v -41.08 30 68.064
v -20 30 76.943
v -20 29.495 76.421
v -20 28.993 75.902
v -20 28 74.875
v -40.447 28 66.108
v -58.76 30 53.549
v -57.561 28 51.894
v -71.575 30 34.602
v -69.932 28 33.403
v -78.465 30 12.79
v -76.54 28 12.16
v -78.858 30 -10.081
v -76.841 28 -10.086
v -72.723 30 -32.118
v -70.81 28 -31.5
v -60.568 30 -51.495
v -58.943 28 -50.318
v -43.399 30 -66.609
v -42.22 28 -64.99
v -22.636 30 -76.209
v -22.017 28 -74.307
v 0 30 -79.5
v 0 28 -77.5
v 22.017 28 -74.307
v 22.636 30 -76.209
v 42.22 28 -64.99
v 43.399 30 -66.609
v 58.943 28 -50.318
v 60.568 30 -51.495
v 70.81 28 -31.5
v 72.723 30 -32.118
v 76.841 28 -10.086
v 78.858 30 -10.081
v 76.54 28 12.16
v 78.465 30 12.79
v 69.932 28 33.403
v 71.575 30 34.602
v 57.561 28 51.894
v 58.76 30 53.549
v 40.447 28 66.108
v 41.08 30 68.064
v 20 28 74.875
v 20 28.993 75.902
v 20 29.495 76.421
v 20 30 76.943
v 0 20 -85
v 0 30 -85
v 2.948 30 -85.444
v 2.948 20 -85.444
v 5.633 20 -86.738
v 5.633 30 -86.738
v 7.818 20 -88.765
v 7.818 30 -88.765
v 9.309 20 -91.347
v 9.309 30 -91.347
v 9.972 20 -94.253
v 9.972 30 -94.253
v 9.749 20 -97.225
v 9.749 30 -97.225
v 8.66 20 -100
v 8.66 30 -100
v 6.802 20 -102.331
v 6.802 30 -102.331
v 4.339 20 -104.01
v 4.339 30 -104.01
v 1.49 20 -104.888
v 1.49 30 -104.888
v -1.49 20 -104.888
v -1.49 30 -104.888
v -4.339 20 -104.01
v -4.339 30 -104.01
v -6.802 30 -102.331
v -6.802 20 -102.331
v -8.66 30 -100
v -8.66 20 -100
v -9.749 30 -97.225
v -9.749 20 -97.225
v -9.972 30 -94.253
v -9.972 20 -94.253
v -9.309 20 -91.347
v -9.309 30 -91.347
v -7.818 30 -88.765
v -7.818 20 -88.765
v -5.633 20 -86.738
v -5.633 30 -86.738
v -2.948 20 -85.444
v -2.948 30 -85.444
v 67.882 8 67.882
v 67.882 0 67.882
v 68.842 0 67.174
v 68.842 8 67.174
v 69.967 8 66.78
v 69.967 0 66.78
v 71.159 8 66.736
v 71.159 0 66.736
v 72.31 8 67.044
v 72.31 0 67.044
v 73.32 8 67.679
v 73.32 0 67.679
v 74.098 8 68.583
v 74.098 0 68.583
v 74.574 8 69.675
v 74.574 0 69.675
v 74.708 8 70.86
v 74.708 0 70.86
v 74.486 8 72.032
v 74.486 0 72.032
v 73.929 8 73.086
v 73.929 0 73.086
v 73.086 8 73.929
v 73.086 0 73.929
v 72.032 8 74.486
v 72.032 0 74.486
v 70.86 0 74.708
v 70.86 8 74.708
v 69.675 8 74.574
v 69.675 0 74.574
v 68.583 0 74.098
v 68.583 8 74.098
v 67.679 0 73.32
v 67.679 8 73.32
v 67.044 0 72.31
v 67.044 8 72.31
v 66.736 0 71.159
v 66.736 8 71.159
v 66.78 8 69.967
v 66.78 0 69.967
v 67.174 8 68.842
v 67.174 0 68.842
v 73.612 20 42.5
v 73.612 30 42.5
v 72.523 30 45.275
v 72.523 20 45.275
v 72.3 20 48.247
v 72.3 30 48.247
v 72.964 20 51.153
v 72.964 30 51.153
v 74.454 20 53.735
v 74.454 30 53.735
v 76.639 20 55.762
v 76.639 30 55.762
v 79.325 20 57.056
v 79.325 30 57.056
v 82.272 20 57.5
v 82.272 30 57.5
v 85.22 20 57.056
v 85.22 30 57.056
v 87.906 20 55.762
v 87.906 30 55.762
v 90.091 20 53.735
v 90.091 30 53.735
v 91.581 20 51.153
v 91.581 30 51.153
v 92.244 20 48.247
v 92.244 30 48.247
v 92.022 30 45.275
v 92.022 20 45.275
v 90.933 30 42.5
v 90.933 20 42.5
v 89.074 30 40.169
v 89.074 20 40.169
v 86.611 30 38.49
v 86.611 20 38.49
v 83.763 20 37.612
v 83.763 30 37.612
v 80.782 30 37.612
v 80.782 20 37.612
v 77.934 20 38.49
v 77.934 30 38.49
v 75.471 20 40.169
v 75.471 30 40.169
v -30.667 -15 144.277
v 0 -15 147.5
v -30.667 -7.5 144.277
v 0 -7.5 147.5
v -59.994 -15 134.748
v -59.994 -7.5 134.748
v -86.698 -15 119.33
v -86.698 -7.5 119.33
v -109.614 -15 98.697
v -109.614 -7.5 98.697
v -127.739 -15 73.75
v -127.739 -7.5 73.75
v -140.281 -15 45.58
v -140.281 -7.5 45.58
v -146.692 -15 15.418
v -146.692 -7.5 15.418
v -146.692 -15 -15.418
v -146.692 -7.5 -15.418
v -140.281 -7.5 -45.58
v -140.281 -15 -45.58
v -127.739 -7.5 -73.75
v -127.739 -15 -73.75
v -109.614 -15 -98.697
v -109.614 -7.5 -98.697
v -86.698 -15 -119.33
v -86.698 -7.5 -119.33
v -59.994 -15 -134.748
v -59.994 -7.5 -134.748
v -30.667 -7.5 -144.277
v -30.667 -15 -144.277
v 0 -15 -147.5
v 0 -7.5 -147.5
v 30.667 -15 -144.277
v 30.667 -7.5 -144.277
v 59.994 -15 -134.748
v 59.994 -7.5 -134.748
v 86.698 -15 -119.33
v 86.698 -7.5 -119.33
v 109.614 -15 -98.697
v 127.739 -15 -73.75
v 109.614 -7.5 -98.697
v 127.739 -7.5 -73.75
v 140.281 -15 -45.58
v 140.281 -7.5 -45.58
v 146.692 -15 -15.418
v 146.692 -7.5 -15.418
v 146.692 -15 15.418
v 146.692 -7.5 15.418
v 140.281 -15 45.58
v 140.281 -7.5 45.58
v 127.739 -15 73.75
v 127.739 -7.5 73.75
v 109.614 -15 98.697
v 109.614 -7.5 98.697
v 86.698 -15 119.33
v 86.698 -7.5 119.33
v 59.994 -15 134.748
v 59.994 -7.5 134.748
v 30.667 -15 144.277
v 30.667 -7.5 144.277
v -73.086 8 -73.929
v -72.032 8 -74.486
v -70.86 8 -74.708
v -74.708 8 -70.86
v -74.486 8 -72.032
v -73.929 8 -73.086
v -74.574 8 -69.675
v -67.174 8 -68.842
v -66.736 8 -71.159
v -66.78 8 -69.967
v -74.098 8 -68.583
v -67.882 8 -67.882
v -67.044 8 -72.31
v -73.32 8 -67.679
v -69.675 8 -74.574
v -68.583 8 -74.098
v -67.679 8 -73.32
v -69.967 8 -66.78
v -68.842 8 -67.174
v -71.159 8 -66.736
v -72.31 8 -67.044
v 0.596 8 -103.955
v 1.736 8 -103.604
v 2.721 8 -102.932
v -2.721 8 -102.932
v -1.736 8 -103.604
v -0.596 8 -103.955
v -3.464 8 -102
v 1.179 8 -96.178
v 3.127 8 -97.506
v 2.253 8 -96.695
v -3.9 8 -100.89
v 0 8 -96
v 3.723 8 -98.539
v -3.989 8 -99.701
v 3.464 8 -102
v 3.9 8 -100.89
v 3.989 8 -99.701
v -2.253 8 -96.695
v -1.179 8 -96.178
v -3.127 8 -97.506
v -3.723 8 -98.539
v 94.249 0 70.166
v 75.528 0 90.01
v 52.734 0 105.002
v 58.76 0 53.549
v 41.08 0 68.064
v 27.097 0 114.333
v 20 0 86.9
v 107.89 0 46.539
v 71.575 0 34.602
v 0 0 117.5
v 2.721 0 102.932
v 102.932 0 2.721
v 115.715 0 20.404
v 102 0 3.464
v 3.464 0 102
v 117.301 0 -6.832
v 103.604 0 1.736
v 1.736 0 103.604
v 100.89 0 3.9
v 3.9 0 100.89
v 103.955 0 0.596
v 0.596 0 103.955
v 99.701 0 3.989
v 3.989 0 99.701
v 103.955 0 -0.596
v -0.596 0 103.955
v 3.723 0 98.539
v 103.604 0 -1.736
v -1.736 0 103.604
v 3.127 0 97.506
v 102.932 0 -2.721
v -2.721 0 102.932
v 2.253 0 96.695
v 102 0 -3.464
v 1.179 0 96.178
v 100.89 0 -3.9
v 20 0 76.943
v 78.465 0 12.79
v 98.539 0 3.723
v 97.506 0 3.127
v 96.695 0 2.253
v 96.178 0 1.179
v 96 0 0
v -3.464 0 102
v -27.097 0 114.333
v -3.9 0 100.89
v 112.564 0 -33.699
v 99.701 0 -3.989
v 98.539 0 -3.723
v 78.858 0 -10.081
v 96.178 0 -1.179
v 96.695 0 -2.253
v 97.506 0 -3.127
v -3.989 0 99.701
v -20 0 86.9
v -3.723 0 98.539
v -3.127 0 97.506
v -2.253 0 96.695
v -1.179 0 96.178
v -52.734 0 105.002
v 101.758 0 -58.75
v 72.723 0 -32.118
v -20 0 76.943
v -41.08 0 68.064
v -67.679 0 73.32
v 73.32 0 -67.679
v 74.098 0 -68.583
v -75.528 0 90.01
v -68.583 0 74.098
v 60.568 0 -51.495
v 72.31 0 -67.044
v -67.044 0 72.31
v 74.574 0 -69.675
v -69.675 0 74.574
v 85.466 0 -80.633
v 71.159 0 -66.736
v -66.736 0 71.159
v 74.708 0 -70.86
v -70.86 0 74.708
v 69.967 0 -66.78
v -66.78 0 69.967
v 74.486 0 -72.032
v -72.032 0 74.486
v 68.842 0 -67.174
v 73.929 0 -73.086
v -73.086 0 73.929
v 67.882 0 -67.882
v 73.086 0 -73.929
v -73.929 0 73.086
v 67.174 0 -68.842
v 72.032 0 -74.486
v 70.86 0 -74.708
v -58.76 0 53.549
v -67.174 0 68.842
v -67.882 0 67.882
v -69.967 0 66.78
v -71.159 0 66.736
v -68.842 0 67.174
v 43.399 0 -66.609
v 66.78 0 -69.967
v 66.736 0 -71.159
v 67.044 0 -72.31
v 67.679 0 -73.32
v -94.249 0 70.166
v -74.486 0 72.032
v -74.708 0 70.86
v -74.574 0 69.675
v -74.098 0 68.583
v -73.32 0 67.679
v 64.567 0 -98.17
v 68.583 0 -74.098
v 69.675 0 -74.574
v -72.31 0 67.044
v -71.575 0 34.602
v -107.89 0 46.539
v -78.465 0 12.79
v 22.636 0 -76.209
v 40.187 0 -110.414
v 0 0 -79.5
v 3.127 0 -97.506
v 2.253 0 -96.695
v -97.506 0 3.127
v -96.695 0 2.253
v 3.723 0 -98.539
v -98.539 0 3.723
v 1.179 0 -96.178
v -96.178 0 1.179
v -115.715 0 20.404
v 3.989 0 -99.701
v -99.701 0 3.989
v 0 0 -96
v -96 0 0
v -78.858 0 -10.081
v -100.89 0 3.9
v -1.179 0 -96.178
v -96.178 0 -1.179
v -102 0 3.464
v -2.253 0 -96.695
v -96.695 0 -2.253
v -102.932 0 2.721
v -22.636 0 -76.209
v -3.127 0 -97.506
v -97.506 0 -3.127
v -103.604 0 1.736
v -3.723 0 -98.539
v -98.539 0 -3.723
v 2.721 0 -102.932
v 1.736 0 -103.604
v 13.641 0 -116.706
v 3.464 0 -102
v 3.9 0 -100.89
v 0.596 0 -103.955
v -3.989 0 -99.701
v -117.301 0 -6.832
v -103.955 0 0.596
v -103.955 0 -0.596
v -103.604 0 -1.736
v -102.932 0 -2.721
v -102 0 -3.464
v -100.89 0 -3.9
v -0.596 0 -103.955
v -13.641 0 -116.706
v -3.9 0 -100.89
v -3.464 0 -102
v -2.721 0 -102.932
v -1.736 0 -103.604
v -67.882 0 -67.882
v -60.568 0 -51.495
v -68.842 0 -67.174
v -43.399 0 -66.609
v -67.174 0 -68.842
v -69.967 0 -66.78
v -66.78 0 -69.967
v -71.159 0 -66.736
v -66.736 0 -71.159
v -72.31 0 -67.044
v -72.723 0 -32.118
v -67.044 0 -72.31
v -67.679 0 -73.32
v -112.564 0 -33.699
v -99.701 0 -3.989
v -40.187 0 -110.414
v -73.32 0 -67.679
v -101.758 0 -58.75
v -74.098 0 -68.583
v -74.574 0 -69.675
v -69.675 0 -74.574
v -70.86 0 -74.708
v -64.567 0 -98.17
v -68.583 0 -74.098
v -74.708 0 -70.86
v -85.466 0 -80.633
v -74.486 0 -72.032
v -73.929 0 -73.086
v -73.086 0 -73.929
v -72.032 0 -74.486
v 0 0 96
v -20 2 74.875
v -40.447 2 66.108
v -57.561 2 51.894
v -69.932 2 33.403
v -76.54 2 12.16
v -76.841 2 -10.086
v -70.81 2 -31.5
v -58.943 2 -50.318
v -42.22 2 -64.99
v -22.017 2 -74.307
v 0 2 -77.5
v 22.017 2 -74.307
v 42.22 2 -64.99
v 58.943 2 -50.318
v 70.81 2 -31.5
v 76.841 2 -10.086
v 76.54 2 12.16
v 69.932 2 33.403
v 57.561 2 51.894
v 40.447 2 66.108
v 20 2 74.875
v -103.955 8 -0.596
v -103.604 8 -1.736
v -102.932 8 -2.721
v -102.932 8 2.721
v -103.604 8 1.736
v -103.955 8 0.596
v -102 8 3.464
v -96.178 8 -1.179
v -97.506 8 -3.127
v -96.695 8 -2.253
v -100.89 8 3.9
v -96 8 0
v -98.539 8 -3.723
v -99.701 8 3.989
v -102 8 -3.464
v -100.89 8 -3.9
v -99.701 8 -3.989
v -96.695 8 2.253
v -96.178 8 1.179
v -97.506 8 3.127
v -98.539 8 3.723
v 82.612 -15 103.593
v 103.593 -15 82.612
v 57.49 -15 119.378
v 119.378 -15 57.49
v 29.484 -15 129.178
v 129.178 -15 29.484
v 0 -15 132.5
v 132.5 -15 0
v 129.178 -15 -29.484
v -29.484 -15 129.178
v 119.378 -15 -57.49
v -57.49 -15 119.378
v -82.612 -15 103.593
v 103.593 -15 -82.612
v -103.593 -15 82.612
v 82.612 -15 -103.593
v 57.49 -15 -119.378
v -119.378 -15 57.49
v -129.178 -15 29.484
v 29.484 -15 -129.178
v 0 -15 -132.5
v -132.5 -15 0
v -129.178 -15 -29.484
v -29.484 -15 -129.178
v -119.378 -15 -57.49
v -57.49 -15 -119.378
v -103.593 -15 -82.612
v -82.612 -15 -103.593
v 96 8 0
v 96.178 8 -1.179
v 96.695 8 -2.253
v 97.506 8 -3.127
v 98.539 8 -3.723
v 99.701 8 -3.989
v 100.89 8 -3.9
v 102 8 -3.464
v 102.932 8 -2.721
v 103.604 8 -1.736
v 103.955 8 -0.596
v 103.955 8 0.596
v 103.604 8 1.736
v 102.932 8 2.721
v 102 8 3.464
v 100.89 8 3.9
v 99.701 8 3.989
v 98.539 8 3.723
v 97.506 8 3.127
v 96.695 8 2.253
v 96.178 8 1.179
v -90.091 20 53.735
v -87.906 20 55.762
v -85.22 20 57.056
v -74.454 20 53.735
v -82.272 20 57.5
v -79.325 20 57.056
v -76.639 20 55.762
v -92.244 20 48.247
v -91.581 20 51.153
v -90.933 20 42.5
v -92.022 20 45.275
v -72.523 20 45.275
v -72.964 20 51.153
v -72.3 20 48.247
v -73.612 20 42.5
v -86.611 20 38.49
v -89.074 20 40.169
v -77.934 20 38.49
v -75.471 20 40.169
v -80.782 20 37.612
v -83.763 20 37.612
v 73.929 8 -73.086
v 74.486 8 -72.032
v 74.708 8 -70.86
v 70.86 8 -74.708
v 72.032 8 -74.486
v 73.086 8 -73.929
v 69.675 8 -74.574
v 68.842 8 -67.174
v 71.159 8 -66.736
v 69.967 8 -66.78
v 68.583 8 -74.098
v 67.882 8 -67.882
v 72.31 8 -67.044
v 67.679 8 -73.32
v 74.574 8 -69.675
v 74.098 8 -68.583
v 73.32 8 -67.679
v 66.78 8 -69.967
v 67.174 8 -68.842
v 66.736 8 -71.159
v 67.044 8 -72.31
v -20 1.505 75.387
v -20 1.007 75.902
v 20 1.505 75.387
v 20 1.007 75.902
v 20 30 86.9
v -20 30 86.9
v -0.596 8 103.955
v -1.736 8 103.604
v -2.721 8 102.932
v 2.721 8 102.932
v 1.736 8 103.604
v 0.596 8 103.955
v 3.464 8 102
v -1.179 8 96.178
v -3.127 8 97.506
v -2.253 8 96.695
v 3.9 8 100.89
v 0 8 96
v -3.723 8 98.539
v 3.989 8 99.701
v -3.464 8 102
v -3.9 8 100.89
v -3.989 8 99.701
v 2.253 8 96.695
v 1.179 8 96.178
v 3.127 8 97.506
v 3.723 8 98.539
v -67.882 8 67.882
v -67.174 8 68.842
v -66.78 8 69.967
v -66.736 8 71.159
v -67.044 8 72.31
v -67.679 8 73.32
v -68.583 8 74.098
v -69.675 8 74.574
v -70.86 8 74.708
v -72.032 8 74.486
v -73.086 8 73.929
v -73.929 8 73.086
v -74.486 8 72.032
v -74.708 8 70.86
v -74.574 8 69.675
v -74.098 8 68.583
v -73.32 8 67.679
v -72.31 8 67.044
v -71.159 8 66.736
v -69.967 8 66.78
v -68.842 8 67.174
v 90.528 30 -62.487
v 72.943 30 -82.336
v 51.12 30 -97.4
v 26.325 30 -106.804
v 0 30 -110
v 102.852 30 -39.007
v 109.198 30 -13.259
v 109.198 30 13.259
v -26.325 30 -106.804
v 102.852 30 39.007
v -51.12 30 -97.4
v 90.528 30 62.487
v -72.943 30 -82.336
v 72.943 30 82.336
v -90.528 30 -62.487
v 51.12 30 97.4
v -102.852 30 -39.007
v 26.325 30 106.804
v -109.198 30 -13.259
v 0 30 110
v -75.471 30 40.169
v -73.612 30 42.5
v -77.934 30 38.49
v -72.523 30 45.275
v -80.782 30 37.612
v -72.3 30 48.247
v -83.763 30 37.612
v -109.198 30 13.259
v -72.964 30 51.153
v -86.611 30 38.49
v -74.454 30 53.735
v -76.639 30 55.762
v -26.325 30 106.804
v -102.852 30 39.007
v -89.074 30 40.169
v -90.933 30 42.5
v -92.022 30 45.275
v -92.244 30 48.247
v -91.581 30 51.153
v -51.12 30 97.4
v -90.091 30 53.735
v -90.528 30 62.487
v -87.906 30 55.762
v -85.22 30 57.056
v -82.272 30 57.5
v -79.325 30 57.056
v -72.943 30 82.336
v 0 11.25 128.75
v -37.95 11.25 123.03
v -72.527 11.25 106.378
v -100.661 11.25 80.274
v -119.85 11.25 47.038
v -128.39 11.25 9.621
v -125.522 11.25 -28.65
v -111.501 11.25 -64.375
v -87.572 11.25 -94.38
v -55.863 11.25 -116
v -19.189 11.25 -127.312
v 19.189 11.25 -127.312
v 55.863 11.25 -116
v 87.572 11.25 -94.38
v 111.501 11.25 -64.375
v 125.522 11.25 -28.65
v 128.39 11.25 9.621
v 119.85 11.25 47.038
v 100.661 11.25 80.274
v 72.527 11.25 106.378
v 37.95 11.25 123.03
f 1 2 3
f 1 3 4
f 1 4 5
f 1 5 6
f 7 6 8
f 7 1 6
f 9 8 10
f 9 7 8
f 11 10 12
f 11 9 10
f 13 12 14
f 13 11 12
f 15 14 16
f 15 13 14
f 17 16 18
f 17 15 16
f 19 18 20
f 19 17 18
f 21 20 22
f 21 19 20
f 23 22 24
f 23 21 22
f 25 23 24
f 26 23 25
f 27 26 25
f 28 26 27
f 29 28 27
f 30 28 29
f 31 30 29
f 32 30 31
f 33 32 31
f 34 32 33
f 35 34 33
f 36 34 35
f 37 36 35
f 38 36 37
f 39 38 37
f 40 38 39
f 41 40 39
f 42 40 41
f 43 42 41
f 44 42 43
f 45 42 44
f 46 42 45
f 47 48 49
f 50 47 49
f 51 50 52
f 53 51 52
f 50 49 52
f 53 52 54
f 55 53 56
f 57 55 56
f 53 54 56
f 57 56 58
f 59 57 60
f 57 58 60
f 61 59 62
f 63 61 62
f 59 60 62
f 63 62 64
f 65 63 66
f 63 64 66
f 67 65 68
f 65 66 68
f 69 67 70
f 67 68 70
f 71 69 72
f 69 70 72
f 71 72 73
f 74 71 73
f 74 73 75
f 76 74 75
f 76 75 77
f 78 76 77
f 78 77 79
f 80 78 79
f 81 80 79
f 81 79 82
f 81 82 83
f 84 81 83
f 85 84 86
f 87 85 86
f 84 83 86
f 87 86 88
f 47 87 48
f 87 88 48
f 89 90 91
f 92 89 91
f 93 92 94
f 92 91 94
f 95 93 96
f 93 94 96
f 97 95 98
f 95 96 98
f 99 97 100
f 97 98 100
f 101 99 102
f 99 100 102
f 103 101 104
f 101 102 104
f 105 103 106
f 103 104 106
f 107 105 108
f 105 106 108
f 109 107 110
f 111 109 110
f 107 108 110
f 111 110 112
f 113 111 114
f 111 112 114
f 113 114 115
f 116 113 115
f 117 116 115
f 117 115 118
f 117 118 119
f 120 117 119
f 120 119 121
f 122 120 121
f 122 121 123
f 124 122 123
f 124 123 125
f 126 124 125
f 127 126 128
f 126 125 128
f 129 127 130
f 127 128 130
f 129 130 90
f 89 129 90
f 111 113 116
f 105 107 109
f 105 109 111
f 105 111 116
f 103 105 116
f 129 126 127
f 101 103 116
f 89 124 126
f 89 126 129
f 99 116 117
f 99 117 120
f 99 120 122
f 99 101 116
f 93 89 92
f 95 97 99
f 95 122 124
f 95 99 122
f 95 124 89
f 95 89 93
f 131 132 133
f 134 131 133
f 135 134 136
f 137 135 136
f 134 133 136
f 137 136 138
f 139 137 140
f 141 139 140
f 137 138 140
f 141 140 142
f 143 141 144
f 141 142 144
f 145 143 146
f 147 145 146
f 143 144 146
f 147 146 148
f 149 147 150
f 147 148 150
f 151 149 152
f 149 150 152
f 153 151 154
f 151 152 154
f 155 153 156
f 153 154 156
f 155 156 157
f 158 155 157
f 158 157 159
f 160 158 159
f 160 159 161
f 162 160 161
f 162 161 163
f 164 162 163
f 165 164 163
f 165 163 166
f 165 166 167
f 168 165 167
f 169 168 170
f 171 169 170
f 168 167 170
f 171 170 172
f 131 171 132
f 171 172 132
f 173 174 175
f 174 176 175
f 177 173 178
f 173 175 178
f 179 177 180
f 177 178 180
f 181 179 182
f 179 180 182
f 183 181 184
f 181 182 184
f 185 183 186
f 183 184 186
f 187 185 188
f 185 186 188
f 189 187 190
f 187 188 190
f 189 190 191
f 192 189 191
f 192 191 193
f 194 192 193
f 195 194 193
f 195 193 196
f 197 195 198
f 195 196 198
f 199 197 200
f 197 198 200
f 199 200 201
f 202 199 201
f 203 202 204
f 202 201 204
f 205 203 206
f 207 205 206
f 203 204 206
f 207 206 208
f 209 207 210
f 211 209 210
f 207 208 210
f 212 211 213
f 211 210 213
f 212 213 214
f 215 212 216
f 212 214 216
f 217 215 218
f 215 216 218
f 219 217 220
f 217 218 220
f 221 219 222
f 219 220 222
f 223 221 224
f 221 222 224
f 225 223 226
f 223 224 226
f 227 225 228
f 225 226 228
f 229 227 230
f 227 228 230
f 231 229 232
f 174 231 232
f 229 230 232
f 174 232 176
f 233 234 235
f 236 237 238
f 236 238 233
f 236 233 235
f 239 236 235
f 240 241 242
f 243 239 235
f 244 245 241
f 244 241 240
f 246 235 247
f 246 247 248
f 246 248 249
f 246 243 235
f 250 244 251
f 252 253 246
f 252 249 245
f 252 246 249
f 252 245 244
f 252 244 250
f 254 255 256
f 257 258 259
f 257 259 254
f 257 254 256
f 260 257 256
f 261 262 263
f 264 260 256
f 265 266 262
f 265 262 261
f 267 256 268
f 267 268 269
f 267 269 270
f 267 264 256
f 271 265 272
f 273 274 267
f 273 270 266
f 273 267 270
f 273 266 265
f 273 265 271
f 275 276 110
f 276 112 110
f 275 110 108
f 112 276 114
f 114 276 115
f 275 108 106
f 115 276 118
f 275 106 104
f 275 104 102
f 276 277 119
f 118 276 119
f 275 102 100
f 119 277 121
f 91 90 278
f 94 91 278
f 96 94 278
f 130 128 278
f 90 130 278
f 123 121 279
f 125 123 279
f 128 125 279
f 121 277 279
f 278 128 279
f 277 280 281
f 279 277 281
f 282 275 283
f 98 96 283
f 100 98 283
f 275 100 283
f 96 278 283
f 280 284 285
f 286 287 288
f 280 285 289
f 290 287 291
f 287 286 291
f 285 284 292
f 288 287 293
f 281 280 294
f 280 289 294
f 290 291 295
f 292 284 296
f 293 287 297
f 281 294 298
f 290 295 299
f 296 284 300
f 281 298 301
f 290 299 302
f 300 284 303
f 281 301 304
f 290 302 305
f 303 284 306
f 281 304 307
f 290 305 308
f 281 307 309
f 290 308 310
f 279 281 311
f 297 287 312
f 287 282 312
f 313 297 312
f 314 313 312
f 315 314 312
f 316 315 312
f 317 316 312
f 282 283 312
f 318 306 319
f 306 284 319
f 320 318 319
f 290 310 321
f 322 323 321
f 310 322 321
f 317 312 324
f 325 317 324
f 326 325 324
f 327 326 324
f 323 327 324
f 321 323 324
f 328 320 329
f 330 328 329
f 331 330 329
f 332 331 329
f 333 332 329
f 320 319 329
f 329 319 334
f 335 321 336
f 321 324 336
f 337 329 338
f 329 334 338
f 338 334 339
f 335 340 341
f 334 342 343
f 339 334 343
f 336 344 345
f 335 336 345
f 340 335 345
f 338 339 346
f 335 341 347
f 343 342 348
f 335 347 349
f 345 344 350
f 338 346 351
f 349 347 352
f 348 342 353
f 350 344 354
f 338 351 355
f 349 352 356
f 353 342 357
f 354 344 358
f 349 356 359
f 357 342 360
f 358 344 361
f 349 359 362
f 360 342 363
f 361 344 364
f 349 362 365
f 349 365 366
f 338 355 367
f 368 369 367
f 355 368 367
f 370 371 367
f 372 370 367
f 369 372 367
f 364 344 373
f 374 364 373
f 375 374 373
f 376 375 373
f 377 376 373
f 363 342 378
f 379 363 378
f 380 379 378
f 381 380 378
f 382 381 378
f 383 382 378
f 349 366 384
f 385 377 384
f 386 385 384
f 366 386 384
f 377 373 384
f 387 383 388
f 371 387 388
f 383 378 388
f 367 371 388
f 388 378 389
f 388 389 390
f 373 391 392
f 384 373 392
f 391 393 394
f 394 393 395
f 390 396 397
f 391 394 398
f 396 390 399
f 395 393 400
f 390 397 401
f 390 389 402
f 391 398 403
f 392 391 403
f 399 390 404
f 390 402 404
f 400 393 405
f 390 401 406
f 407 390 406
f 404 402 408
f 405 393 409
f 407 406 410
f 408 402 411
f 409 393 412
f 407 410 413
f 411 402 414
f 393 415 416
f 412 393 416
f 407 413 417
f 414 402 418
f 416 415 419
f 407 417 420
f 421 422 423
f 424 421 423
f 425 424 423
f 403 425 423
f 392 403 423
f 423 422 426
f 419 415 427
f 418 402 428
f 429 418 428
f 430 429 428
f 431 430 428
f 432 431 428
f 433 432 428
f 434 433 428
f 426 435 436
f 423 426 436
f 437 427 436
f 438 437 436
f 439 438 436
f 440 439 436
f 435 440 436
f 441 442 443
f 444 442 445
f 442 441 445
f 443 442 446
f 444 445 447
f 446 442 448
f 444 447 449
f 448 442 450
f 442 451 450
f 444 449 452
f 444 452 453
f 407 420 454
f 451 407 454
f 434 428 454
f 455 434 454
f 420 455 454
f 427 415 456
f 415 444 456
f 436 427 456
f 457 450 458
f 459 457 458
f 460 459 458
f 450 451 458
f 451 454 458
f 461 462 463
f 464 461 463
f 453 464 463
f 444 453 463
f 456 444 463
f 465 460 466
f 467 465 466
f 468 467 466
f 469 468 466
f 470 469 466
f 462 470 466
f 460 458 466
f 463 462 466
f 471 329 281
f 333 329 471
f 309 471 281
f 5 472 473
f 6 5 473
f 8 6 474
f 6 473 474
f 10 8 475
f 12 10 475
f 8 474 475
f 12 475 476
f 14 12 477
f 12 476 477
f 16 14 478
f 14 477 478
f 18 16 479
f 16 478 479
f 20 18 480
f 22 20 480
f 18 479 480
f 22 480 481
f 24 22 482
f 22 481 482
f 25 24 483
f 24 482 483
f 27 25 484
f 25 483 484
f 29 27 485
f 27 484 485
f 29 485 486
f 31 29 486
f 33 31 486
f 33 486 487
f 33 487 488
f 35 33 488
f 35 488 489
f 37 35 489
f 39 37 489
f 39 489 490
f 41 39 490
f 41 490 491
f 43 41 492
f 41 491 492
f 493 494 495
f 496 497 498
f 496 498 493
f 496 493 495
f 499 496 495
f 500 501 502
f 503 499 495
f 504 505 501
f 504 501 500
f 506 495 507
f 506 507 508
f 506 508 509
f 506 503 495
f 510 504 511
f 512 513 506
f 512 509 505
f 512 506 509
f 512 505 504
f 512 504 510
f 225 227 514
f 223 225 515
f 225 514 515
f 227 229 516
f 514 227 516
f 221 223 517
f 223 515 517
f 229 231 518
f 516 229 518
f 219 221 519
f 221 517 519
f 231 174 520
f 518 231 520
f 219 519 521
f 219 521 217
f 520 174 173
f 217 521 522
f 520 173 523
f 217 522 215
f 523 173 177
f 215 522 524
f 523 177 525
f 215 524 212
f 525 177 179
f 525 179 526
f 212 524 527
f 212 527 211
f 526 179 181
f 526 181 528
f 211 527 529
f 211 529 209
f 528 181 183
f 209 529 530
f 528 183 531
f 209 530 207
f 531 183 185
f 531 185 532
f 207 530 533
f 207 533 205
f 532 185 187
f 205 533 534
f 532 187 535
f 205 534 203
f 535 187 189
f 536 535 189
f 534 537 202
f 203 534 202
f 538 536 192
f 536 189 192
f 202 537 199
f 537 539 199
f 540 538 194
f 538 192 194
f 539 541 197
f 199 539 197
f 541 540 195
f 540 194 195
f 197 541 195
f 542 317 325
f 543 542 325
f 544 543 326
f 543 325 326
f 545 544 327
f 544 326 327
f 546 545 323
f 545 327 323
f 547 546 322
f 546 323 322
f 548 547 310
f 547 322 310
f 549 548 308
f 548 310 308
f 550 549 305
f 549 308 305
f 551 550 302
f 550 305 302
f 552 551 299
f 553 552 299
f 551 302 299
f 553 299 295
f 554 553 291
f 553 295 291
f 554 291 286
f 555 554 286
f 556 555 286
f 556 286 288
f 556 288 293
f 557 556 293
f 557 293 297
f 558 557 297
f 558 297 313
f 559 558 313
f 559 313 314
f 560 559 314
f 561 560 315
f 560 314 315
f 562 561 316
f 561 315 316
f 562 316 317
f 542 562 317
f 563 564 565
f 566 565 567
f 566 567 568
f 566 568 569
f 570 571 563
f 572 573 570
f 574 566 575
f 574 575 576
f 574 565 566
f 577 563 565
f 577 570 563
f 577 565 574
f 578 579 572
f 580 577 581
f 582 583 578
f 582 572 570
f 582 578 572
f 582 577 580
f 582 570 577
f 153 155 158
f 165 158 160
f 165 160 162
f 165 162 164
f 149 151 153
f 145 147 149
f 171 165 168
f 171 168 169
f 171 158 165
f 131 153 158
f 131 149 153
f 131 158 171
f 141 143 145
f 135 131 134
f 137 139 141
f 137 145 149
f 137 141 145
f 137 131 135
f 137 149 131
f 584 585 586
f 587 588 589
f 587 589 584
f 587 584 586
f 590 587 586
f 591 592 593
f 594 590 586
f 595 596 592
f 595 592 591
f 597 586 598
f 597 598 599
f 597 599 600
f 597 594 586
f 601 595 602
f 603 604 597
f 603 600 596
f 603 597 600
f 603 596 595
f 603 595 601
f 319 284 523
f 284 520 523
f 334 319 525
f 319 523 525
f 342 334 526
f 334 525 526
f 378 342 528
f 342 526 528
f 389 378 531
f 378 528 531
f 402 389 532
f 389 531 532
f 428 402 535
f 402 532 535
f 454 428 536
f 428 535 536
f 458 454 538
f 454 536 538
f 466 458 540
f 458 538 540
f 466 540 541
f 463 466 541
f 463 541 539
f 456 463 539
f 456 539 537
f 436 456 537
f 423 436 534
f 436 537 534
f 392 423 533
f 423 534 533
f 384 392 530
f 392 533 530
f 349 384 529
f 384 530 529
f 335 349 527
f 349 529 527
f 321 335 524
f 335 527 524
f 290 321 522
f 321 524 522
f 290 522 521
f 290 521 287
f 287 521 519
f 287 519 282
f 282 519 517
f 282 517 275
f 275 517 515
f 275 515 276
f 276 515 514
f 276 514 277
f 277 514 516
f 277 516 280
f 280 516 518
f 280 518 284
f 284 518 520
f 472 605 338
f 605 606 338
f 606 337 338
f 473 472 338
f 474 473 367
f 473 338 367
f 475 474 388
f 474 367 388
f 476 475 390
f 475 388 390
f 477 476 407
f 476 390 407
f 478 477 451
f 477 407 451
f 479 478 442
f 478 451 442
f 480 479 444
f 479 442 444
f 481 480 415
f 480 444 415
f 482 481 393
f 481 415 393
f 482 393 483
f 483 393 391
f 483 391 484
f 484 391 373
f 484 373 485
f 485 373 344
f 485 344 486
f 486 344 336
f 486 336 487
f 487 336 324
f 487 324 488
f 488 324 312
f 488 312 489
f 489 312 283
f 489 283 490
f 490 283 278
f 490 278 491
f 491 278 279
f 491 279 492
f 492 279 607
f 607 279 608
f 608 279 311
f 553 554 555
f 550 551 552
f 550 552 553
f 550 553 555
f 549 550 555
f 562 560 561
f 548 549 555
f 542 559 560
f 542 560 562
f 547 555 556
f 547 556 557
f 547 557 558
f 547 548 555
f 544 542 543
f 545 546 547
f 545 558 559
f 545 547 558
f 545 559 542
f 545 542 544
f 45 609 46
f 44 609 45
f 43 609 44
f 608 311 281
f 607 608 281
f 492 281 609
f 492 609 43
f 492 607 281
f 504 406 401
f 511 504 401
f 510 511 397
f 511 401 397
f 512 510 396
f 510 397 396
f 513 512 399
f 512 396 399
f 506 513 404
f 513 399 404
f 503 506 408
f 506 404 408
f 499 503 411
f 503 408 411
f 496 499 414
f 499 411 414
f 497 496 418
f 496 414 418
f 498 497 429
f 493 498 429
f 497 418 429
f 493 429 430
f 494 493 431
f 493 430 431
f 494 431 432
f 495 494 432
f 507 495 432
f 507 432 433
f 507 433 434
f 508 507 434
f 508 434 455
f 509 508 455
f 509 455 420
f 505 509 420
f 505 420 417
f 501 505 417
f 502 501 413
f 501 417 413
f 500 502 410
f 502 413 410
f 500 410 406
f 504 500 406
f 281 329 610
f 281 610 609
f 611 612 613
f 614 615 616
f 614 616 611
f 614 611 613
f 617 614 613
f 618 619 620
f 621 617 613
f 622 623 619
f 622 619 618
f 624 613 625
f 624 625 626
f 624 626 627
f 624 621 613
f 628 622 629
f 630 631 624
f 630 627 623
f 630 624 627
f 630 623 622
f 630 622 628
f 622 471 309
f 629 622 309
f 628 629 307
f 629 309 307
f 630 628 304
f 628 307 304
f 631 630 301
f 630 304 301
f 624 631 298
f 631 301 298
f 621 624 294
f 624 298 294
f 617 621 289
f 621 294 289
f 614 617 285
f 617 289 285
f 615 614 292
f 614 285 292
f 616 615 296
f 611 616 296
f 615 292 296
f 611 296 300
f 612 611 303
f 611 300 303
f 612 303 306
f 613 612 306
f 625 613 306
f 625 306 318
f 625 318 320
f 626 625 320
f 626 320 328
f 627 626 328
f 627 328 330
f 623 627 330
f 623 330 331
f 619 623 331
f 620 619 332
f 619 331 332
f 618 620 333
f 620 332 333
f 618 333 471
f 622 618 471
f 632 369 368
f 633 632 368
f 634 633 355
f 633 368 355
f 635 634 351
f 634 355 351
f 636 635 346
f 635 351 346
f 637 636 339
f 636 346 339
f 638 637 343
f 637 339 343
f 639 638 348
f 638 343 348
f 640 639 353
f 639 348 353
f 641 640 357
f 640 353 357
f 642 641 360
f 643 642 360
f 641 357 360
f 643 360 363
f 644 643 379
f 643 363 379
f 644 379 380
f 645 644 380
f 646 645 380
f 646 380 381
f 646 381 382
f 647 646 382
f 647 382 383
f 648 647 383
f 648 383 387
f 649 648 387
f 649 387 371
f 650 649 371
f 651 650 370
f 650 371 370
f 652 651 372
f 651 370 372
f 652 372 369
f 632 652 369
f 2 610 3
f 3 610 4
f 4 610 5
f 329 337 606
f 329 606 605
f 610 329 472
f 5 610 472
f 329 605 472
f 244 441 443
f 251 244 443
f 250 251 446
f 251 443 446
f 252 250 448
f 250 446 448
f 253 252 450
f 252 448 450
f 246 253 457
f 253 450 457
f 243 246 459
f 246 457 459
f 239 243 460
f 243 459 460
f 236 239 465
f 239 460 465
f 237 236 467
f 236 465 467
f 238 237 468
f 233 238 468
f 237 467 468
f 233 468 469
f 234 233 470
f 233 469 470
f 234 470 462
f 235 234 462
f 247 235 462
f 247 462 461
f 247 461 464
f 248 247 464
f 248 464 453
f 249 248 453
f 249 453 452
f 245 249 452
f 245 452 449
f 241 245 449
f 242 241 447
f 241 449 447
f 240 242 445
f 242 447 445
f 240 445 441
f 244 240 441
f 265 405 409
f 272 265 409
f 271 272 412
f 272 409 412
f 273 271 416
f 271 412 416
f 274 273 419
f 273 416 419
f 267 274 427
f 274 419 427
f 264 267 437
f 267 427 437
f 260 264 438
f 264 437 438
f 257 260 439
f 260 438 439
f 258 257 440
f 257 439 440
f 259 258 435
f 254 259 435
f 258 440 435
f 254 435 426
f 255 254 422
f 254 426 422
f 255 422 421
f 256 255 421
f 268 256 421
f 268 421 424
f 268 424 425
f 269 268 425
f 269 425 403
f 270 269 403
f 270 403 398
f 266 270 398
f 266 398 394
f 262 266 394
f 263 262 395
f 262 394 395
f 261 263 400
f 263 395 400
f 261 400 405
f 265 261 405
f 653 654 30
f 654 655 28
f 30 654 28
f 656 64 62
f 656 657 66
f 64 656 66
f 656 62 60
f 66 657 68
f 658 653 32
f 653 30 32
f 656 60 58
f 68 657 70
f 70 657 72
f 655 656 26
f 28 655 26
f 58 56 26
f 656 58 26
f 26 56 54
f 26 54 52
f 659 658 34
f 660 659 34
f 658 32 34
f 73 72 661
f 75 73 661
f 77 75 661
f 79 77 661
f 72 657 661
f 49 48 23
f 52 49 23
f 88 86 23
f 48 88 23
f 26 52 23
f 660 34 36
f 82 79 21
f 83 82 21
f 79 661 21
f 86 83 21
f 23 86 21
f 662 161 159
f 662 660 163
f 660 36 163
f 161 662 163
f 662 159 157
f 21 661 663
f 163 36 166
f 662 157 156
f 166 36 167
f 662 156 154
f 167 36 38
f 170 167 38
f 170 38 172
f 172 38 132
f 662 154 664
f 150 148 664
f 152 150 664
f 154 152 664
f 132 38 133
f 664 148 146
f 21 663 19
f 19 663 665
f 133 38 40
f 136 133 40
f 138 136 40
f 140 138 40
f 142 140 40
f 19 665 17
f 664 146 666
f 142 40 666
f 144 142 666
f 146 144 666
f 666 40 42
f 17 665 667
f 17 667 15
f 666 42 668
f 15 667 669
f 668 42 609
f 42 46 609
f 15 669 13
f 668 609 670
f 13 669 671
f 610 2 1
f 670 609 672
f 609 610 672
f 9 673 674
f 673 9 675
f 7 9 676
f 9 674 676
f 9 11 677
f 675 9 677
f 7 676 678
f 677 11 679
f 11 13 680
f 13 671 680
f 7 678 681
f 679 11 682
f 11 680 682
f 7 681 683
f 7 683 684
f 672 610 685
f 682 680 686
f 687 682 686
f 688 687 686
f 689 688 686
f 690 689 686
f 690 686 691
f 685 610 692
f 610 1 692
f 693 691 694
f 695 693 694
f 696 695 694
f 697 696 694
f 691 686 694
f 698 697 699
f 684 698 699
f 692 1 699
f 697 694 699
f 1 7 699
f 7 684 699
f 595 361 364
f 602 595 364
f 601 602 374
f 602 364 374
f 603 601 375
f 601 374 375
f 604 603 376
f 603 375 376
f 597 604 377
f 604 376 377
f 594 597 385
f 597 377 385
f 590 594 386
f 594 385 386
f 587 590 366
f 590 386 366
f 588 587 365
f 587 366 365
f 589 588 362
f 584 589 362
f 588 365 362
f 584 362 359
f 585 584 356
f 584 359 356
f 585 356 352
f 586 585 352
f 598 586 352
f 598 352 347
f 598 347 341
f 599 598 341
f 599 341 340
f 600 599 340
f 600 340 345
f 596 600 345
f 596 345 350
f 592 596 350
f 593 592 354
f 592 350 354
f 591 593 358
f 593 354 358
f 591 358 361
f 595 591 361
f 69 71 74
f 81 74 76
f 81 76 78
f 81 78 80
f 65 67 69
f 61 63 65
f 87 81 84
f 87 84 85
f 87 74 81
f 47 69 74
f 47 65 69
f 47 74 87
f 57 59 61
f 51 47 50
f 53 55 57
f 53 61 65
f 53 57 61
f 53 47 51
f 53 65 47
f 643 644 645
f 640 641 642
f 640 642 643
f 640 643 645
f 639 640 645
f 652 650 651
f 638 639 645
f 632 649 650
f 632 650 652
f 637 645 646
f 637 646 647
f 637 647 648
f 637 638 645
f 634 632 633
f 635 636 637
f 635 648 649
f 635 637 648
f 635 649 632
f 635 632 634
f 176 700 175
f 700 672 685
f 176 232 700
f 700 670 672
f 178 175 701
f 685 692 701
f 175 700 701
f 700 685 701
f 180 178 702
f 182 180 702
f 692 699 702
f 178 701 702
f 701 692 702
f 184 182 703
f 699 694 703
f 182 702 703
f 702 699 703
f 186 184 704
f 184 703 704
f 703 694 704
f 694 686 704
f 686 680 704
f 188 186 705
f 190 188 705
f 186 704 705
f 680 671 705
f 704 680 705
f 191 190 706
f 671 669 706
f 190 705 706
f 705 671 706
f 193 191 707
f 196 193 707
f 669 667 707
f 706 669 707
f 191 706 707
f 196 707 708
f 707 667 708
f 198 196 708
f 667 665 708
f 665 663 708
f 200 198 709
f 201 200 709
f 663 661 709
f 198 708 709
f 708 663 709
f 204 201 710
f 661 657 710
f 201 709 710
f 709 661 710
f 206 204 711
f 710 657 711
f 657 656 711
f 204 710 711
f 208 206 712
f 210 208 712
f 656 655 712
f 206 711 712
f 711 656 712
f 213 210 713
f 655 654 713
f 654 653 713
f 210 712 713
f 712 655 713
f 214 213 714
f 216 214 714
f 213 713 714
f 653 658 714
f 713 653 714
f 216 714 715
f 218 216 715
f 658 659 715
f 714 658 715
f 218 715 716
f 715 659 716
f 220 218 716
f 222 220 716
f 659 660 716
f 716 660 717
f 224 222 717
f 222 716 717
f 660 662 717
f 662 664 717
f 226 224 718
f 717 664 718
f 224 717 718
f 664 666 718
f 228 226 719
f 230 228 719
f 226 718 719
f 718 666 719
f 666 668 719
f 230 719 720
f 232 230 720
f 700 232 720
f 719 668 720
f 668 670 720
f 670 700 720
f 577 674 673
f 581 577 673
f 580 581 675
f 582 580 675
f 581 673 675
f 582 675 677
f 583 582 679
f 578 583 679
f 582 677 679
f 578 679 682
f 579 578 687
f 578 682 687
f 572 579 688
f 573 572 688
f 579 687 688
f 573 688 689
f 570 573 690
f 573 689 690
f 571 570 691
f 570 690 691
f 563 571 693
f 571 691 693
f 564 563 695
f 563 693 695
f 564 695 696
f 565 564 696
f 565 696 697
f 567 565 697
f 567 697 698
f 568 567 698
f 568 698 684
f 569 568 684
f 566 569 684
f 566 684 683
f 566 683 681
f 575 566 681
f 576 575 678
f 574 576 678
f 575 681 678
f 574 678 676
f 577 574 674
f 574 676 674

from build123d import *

# Parameters (mm, degrees)
CHAMFER_1_SIZE           = 2
SKETCH_2_R               = 10
CUT_EXTRUDE_1_DEPTH      = 10
PATTERN_CIRCULAR_1_COUNT = 3
CUT_EXTRUDE_2_DEPTH      = 214.395173329
CUT_EXTRUDE_2_DEPTH_BACK = 214.395173329
SKETCH_3_W               = 40
SKETCH_3_H               = 24.854018102
SKETCH_4_R               = 4
CUT_EXTRUDE_3_DEPTH      = 8
PATTERN_CIRCULAR_2_COUNT = 8


with BuildPart() as part:
    # Эскиз1 → Повернуть1 (revolve)
    with BuildSketch(Plane.XY, mode=Mode.PRIVATE) as revolve_1_sk:
        Polygon((77.5, 30), (77.5, 0), (117.5, 0), (132.5, -15), (147.5, -15), (147.5, -7.5), (110, 30), align=None)
    revolve(revolve_1_sk.sketch.rotate(Axis((0, 107.750556793, 0), (0, -1, 0)), 90), axis=Axis((0, 107.750556793, 0), (0, -1, 0)))

    # Фаска1
    chamfer_1_edges = [part.edges().sort_by_distance(p)[0] for p in [
        (0, 0, -77.5),
        (0, 30, -77.5),
    ]]
    chamfer(chamfer_1_edges, length=CHAMFER_1_SIZE)

    # Эскиз2 → Вырез-Вытянуть1 (cut)
    with BuildSketch(Plane(origin=(0, 30, 0), x_dir=(1, 0, 0), z_dir=(0, 1, 0))):
        with Locations(Location((0, 95, 0), (0, 0, 270))):
            Circle(SKETCH_2_R)
    cut_extrude_1 = extrude(amount=-CUT_EXTRUDE_1_DEPTH, mode=Mode.SUBTRACT)

    # Круговой массив1: Вырез-Вытянуть1 ×3 about axis
    pattern_circular_1_axis = Axis((0, 0, 0), (0, 1, 0))
    for i in range(1, PATTERN_CIRCULAR_1_COUNT):
        add(cut_extrude_1.rotate(pattern_circular_1_axis, i * 360 / PATTERN_CIRCULAR_1_COUNT), mode=Mode.SUBTRACT)

    # Эскиз3 → Вырез-Вытянуть2 (cut, two sides: drawn at the far end of the back side and taken through both)
    with BuildSketch(Plane(origin=(0, 30, 0), x_dir=(1, 0, 0), z_dir=(0, 1, 0)).offset(-CUT_EXTRUDE_2_DEPTH_BACK)):
        with Locations((0, -74.472990949)):
            Rectangle(SKETCH_3_W, SKETCH_3_H)
    extrude(amount=CUT_EXTRUDE_2_DEPTH + CUT_EXTRUDE_2_DEPTH_BACK, mode=Mode.SUBTRACT)

    # Эскиз4 → Вырез-Вытянуть3 (cut)
    with BuildSketch(Plane.XZ):
        with Locations(Location((0, 100, 0), (0, 0, 270))):
            Circle(SKETCH_4_R)
    cut_extrude_3 = extrude(amount=-CUT_EXTRUDE_3_DEPTH, mode=Mode.SUBTRACT)

    # Круговой массив2: Вырез-Вытянуть3 ×8 about axis
    pattern_circular_2_axis = Axis((0, 0, 0), (0, 1, 0))
    for i in range(1, PATTERN_CIRCULAR_2_COUNT):
        add(cut_extrude_3.rotate(pattern_circular_2_axis, i * 360 / PATTERN_CIRCULAR_2_COUNT), mode=Mode.SUBTRACT)


solid = part.part
